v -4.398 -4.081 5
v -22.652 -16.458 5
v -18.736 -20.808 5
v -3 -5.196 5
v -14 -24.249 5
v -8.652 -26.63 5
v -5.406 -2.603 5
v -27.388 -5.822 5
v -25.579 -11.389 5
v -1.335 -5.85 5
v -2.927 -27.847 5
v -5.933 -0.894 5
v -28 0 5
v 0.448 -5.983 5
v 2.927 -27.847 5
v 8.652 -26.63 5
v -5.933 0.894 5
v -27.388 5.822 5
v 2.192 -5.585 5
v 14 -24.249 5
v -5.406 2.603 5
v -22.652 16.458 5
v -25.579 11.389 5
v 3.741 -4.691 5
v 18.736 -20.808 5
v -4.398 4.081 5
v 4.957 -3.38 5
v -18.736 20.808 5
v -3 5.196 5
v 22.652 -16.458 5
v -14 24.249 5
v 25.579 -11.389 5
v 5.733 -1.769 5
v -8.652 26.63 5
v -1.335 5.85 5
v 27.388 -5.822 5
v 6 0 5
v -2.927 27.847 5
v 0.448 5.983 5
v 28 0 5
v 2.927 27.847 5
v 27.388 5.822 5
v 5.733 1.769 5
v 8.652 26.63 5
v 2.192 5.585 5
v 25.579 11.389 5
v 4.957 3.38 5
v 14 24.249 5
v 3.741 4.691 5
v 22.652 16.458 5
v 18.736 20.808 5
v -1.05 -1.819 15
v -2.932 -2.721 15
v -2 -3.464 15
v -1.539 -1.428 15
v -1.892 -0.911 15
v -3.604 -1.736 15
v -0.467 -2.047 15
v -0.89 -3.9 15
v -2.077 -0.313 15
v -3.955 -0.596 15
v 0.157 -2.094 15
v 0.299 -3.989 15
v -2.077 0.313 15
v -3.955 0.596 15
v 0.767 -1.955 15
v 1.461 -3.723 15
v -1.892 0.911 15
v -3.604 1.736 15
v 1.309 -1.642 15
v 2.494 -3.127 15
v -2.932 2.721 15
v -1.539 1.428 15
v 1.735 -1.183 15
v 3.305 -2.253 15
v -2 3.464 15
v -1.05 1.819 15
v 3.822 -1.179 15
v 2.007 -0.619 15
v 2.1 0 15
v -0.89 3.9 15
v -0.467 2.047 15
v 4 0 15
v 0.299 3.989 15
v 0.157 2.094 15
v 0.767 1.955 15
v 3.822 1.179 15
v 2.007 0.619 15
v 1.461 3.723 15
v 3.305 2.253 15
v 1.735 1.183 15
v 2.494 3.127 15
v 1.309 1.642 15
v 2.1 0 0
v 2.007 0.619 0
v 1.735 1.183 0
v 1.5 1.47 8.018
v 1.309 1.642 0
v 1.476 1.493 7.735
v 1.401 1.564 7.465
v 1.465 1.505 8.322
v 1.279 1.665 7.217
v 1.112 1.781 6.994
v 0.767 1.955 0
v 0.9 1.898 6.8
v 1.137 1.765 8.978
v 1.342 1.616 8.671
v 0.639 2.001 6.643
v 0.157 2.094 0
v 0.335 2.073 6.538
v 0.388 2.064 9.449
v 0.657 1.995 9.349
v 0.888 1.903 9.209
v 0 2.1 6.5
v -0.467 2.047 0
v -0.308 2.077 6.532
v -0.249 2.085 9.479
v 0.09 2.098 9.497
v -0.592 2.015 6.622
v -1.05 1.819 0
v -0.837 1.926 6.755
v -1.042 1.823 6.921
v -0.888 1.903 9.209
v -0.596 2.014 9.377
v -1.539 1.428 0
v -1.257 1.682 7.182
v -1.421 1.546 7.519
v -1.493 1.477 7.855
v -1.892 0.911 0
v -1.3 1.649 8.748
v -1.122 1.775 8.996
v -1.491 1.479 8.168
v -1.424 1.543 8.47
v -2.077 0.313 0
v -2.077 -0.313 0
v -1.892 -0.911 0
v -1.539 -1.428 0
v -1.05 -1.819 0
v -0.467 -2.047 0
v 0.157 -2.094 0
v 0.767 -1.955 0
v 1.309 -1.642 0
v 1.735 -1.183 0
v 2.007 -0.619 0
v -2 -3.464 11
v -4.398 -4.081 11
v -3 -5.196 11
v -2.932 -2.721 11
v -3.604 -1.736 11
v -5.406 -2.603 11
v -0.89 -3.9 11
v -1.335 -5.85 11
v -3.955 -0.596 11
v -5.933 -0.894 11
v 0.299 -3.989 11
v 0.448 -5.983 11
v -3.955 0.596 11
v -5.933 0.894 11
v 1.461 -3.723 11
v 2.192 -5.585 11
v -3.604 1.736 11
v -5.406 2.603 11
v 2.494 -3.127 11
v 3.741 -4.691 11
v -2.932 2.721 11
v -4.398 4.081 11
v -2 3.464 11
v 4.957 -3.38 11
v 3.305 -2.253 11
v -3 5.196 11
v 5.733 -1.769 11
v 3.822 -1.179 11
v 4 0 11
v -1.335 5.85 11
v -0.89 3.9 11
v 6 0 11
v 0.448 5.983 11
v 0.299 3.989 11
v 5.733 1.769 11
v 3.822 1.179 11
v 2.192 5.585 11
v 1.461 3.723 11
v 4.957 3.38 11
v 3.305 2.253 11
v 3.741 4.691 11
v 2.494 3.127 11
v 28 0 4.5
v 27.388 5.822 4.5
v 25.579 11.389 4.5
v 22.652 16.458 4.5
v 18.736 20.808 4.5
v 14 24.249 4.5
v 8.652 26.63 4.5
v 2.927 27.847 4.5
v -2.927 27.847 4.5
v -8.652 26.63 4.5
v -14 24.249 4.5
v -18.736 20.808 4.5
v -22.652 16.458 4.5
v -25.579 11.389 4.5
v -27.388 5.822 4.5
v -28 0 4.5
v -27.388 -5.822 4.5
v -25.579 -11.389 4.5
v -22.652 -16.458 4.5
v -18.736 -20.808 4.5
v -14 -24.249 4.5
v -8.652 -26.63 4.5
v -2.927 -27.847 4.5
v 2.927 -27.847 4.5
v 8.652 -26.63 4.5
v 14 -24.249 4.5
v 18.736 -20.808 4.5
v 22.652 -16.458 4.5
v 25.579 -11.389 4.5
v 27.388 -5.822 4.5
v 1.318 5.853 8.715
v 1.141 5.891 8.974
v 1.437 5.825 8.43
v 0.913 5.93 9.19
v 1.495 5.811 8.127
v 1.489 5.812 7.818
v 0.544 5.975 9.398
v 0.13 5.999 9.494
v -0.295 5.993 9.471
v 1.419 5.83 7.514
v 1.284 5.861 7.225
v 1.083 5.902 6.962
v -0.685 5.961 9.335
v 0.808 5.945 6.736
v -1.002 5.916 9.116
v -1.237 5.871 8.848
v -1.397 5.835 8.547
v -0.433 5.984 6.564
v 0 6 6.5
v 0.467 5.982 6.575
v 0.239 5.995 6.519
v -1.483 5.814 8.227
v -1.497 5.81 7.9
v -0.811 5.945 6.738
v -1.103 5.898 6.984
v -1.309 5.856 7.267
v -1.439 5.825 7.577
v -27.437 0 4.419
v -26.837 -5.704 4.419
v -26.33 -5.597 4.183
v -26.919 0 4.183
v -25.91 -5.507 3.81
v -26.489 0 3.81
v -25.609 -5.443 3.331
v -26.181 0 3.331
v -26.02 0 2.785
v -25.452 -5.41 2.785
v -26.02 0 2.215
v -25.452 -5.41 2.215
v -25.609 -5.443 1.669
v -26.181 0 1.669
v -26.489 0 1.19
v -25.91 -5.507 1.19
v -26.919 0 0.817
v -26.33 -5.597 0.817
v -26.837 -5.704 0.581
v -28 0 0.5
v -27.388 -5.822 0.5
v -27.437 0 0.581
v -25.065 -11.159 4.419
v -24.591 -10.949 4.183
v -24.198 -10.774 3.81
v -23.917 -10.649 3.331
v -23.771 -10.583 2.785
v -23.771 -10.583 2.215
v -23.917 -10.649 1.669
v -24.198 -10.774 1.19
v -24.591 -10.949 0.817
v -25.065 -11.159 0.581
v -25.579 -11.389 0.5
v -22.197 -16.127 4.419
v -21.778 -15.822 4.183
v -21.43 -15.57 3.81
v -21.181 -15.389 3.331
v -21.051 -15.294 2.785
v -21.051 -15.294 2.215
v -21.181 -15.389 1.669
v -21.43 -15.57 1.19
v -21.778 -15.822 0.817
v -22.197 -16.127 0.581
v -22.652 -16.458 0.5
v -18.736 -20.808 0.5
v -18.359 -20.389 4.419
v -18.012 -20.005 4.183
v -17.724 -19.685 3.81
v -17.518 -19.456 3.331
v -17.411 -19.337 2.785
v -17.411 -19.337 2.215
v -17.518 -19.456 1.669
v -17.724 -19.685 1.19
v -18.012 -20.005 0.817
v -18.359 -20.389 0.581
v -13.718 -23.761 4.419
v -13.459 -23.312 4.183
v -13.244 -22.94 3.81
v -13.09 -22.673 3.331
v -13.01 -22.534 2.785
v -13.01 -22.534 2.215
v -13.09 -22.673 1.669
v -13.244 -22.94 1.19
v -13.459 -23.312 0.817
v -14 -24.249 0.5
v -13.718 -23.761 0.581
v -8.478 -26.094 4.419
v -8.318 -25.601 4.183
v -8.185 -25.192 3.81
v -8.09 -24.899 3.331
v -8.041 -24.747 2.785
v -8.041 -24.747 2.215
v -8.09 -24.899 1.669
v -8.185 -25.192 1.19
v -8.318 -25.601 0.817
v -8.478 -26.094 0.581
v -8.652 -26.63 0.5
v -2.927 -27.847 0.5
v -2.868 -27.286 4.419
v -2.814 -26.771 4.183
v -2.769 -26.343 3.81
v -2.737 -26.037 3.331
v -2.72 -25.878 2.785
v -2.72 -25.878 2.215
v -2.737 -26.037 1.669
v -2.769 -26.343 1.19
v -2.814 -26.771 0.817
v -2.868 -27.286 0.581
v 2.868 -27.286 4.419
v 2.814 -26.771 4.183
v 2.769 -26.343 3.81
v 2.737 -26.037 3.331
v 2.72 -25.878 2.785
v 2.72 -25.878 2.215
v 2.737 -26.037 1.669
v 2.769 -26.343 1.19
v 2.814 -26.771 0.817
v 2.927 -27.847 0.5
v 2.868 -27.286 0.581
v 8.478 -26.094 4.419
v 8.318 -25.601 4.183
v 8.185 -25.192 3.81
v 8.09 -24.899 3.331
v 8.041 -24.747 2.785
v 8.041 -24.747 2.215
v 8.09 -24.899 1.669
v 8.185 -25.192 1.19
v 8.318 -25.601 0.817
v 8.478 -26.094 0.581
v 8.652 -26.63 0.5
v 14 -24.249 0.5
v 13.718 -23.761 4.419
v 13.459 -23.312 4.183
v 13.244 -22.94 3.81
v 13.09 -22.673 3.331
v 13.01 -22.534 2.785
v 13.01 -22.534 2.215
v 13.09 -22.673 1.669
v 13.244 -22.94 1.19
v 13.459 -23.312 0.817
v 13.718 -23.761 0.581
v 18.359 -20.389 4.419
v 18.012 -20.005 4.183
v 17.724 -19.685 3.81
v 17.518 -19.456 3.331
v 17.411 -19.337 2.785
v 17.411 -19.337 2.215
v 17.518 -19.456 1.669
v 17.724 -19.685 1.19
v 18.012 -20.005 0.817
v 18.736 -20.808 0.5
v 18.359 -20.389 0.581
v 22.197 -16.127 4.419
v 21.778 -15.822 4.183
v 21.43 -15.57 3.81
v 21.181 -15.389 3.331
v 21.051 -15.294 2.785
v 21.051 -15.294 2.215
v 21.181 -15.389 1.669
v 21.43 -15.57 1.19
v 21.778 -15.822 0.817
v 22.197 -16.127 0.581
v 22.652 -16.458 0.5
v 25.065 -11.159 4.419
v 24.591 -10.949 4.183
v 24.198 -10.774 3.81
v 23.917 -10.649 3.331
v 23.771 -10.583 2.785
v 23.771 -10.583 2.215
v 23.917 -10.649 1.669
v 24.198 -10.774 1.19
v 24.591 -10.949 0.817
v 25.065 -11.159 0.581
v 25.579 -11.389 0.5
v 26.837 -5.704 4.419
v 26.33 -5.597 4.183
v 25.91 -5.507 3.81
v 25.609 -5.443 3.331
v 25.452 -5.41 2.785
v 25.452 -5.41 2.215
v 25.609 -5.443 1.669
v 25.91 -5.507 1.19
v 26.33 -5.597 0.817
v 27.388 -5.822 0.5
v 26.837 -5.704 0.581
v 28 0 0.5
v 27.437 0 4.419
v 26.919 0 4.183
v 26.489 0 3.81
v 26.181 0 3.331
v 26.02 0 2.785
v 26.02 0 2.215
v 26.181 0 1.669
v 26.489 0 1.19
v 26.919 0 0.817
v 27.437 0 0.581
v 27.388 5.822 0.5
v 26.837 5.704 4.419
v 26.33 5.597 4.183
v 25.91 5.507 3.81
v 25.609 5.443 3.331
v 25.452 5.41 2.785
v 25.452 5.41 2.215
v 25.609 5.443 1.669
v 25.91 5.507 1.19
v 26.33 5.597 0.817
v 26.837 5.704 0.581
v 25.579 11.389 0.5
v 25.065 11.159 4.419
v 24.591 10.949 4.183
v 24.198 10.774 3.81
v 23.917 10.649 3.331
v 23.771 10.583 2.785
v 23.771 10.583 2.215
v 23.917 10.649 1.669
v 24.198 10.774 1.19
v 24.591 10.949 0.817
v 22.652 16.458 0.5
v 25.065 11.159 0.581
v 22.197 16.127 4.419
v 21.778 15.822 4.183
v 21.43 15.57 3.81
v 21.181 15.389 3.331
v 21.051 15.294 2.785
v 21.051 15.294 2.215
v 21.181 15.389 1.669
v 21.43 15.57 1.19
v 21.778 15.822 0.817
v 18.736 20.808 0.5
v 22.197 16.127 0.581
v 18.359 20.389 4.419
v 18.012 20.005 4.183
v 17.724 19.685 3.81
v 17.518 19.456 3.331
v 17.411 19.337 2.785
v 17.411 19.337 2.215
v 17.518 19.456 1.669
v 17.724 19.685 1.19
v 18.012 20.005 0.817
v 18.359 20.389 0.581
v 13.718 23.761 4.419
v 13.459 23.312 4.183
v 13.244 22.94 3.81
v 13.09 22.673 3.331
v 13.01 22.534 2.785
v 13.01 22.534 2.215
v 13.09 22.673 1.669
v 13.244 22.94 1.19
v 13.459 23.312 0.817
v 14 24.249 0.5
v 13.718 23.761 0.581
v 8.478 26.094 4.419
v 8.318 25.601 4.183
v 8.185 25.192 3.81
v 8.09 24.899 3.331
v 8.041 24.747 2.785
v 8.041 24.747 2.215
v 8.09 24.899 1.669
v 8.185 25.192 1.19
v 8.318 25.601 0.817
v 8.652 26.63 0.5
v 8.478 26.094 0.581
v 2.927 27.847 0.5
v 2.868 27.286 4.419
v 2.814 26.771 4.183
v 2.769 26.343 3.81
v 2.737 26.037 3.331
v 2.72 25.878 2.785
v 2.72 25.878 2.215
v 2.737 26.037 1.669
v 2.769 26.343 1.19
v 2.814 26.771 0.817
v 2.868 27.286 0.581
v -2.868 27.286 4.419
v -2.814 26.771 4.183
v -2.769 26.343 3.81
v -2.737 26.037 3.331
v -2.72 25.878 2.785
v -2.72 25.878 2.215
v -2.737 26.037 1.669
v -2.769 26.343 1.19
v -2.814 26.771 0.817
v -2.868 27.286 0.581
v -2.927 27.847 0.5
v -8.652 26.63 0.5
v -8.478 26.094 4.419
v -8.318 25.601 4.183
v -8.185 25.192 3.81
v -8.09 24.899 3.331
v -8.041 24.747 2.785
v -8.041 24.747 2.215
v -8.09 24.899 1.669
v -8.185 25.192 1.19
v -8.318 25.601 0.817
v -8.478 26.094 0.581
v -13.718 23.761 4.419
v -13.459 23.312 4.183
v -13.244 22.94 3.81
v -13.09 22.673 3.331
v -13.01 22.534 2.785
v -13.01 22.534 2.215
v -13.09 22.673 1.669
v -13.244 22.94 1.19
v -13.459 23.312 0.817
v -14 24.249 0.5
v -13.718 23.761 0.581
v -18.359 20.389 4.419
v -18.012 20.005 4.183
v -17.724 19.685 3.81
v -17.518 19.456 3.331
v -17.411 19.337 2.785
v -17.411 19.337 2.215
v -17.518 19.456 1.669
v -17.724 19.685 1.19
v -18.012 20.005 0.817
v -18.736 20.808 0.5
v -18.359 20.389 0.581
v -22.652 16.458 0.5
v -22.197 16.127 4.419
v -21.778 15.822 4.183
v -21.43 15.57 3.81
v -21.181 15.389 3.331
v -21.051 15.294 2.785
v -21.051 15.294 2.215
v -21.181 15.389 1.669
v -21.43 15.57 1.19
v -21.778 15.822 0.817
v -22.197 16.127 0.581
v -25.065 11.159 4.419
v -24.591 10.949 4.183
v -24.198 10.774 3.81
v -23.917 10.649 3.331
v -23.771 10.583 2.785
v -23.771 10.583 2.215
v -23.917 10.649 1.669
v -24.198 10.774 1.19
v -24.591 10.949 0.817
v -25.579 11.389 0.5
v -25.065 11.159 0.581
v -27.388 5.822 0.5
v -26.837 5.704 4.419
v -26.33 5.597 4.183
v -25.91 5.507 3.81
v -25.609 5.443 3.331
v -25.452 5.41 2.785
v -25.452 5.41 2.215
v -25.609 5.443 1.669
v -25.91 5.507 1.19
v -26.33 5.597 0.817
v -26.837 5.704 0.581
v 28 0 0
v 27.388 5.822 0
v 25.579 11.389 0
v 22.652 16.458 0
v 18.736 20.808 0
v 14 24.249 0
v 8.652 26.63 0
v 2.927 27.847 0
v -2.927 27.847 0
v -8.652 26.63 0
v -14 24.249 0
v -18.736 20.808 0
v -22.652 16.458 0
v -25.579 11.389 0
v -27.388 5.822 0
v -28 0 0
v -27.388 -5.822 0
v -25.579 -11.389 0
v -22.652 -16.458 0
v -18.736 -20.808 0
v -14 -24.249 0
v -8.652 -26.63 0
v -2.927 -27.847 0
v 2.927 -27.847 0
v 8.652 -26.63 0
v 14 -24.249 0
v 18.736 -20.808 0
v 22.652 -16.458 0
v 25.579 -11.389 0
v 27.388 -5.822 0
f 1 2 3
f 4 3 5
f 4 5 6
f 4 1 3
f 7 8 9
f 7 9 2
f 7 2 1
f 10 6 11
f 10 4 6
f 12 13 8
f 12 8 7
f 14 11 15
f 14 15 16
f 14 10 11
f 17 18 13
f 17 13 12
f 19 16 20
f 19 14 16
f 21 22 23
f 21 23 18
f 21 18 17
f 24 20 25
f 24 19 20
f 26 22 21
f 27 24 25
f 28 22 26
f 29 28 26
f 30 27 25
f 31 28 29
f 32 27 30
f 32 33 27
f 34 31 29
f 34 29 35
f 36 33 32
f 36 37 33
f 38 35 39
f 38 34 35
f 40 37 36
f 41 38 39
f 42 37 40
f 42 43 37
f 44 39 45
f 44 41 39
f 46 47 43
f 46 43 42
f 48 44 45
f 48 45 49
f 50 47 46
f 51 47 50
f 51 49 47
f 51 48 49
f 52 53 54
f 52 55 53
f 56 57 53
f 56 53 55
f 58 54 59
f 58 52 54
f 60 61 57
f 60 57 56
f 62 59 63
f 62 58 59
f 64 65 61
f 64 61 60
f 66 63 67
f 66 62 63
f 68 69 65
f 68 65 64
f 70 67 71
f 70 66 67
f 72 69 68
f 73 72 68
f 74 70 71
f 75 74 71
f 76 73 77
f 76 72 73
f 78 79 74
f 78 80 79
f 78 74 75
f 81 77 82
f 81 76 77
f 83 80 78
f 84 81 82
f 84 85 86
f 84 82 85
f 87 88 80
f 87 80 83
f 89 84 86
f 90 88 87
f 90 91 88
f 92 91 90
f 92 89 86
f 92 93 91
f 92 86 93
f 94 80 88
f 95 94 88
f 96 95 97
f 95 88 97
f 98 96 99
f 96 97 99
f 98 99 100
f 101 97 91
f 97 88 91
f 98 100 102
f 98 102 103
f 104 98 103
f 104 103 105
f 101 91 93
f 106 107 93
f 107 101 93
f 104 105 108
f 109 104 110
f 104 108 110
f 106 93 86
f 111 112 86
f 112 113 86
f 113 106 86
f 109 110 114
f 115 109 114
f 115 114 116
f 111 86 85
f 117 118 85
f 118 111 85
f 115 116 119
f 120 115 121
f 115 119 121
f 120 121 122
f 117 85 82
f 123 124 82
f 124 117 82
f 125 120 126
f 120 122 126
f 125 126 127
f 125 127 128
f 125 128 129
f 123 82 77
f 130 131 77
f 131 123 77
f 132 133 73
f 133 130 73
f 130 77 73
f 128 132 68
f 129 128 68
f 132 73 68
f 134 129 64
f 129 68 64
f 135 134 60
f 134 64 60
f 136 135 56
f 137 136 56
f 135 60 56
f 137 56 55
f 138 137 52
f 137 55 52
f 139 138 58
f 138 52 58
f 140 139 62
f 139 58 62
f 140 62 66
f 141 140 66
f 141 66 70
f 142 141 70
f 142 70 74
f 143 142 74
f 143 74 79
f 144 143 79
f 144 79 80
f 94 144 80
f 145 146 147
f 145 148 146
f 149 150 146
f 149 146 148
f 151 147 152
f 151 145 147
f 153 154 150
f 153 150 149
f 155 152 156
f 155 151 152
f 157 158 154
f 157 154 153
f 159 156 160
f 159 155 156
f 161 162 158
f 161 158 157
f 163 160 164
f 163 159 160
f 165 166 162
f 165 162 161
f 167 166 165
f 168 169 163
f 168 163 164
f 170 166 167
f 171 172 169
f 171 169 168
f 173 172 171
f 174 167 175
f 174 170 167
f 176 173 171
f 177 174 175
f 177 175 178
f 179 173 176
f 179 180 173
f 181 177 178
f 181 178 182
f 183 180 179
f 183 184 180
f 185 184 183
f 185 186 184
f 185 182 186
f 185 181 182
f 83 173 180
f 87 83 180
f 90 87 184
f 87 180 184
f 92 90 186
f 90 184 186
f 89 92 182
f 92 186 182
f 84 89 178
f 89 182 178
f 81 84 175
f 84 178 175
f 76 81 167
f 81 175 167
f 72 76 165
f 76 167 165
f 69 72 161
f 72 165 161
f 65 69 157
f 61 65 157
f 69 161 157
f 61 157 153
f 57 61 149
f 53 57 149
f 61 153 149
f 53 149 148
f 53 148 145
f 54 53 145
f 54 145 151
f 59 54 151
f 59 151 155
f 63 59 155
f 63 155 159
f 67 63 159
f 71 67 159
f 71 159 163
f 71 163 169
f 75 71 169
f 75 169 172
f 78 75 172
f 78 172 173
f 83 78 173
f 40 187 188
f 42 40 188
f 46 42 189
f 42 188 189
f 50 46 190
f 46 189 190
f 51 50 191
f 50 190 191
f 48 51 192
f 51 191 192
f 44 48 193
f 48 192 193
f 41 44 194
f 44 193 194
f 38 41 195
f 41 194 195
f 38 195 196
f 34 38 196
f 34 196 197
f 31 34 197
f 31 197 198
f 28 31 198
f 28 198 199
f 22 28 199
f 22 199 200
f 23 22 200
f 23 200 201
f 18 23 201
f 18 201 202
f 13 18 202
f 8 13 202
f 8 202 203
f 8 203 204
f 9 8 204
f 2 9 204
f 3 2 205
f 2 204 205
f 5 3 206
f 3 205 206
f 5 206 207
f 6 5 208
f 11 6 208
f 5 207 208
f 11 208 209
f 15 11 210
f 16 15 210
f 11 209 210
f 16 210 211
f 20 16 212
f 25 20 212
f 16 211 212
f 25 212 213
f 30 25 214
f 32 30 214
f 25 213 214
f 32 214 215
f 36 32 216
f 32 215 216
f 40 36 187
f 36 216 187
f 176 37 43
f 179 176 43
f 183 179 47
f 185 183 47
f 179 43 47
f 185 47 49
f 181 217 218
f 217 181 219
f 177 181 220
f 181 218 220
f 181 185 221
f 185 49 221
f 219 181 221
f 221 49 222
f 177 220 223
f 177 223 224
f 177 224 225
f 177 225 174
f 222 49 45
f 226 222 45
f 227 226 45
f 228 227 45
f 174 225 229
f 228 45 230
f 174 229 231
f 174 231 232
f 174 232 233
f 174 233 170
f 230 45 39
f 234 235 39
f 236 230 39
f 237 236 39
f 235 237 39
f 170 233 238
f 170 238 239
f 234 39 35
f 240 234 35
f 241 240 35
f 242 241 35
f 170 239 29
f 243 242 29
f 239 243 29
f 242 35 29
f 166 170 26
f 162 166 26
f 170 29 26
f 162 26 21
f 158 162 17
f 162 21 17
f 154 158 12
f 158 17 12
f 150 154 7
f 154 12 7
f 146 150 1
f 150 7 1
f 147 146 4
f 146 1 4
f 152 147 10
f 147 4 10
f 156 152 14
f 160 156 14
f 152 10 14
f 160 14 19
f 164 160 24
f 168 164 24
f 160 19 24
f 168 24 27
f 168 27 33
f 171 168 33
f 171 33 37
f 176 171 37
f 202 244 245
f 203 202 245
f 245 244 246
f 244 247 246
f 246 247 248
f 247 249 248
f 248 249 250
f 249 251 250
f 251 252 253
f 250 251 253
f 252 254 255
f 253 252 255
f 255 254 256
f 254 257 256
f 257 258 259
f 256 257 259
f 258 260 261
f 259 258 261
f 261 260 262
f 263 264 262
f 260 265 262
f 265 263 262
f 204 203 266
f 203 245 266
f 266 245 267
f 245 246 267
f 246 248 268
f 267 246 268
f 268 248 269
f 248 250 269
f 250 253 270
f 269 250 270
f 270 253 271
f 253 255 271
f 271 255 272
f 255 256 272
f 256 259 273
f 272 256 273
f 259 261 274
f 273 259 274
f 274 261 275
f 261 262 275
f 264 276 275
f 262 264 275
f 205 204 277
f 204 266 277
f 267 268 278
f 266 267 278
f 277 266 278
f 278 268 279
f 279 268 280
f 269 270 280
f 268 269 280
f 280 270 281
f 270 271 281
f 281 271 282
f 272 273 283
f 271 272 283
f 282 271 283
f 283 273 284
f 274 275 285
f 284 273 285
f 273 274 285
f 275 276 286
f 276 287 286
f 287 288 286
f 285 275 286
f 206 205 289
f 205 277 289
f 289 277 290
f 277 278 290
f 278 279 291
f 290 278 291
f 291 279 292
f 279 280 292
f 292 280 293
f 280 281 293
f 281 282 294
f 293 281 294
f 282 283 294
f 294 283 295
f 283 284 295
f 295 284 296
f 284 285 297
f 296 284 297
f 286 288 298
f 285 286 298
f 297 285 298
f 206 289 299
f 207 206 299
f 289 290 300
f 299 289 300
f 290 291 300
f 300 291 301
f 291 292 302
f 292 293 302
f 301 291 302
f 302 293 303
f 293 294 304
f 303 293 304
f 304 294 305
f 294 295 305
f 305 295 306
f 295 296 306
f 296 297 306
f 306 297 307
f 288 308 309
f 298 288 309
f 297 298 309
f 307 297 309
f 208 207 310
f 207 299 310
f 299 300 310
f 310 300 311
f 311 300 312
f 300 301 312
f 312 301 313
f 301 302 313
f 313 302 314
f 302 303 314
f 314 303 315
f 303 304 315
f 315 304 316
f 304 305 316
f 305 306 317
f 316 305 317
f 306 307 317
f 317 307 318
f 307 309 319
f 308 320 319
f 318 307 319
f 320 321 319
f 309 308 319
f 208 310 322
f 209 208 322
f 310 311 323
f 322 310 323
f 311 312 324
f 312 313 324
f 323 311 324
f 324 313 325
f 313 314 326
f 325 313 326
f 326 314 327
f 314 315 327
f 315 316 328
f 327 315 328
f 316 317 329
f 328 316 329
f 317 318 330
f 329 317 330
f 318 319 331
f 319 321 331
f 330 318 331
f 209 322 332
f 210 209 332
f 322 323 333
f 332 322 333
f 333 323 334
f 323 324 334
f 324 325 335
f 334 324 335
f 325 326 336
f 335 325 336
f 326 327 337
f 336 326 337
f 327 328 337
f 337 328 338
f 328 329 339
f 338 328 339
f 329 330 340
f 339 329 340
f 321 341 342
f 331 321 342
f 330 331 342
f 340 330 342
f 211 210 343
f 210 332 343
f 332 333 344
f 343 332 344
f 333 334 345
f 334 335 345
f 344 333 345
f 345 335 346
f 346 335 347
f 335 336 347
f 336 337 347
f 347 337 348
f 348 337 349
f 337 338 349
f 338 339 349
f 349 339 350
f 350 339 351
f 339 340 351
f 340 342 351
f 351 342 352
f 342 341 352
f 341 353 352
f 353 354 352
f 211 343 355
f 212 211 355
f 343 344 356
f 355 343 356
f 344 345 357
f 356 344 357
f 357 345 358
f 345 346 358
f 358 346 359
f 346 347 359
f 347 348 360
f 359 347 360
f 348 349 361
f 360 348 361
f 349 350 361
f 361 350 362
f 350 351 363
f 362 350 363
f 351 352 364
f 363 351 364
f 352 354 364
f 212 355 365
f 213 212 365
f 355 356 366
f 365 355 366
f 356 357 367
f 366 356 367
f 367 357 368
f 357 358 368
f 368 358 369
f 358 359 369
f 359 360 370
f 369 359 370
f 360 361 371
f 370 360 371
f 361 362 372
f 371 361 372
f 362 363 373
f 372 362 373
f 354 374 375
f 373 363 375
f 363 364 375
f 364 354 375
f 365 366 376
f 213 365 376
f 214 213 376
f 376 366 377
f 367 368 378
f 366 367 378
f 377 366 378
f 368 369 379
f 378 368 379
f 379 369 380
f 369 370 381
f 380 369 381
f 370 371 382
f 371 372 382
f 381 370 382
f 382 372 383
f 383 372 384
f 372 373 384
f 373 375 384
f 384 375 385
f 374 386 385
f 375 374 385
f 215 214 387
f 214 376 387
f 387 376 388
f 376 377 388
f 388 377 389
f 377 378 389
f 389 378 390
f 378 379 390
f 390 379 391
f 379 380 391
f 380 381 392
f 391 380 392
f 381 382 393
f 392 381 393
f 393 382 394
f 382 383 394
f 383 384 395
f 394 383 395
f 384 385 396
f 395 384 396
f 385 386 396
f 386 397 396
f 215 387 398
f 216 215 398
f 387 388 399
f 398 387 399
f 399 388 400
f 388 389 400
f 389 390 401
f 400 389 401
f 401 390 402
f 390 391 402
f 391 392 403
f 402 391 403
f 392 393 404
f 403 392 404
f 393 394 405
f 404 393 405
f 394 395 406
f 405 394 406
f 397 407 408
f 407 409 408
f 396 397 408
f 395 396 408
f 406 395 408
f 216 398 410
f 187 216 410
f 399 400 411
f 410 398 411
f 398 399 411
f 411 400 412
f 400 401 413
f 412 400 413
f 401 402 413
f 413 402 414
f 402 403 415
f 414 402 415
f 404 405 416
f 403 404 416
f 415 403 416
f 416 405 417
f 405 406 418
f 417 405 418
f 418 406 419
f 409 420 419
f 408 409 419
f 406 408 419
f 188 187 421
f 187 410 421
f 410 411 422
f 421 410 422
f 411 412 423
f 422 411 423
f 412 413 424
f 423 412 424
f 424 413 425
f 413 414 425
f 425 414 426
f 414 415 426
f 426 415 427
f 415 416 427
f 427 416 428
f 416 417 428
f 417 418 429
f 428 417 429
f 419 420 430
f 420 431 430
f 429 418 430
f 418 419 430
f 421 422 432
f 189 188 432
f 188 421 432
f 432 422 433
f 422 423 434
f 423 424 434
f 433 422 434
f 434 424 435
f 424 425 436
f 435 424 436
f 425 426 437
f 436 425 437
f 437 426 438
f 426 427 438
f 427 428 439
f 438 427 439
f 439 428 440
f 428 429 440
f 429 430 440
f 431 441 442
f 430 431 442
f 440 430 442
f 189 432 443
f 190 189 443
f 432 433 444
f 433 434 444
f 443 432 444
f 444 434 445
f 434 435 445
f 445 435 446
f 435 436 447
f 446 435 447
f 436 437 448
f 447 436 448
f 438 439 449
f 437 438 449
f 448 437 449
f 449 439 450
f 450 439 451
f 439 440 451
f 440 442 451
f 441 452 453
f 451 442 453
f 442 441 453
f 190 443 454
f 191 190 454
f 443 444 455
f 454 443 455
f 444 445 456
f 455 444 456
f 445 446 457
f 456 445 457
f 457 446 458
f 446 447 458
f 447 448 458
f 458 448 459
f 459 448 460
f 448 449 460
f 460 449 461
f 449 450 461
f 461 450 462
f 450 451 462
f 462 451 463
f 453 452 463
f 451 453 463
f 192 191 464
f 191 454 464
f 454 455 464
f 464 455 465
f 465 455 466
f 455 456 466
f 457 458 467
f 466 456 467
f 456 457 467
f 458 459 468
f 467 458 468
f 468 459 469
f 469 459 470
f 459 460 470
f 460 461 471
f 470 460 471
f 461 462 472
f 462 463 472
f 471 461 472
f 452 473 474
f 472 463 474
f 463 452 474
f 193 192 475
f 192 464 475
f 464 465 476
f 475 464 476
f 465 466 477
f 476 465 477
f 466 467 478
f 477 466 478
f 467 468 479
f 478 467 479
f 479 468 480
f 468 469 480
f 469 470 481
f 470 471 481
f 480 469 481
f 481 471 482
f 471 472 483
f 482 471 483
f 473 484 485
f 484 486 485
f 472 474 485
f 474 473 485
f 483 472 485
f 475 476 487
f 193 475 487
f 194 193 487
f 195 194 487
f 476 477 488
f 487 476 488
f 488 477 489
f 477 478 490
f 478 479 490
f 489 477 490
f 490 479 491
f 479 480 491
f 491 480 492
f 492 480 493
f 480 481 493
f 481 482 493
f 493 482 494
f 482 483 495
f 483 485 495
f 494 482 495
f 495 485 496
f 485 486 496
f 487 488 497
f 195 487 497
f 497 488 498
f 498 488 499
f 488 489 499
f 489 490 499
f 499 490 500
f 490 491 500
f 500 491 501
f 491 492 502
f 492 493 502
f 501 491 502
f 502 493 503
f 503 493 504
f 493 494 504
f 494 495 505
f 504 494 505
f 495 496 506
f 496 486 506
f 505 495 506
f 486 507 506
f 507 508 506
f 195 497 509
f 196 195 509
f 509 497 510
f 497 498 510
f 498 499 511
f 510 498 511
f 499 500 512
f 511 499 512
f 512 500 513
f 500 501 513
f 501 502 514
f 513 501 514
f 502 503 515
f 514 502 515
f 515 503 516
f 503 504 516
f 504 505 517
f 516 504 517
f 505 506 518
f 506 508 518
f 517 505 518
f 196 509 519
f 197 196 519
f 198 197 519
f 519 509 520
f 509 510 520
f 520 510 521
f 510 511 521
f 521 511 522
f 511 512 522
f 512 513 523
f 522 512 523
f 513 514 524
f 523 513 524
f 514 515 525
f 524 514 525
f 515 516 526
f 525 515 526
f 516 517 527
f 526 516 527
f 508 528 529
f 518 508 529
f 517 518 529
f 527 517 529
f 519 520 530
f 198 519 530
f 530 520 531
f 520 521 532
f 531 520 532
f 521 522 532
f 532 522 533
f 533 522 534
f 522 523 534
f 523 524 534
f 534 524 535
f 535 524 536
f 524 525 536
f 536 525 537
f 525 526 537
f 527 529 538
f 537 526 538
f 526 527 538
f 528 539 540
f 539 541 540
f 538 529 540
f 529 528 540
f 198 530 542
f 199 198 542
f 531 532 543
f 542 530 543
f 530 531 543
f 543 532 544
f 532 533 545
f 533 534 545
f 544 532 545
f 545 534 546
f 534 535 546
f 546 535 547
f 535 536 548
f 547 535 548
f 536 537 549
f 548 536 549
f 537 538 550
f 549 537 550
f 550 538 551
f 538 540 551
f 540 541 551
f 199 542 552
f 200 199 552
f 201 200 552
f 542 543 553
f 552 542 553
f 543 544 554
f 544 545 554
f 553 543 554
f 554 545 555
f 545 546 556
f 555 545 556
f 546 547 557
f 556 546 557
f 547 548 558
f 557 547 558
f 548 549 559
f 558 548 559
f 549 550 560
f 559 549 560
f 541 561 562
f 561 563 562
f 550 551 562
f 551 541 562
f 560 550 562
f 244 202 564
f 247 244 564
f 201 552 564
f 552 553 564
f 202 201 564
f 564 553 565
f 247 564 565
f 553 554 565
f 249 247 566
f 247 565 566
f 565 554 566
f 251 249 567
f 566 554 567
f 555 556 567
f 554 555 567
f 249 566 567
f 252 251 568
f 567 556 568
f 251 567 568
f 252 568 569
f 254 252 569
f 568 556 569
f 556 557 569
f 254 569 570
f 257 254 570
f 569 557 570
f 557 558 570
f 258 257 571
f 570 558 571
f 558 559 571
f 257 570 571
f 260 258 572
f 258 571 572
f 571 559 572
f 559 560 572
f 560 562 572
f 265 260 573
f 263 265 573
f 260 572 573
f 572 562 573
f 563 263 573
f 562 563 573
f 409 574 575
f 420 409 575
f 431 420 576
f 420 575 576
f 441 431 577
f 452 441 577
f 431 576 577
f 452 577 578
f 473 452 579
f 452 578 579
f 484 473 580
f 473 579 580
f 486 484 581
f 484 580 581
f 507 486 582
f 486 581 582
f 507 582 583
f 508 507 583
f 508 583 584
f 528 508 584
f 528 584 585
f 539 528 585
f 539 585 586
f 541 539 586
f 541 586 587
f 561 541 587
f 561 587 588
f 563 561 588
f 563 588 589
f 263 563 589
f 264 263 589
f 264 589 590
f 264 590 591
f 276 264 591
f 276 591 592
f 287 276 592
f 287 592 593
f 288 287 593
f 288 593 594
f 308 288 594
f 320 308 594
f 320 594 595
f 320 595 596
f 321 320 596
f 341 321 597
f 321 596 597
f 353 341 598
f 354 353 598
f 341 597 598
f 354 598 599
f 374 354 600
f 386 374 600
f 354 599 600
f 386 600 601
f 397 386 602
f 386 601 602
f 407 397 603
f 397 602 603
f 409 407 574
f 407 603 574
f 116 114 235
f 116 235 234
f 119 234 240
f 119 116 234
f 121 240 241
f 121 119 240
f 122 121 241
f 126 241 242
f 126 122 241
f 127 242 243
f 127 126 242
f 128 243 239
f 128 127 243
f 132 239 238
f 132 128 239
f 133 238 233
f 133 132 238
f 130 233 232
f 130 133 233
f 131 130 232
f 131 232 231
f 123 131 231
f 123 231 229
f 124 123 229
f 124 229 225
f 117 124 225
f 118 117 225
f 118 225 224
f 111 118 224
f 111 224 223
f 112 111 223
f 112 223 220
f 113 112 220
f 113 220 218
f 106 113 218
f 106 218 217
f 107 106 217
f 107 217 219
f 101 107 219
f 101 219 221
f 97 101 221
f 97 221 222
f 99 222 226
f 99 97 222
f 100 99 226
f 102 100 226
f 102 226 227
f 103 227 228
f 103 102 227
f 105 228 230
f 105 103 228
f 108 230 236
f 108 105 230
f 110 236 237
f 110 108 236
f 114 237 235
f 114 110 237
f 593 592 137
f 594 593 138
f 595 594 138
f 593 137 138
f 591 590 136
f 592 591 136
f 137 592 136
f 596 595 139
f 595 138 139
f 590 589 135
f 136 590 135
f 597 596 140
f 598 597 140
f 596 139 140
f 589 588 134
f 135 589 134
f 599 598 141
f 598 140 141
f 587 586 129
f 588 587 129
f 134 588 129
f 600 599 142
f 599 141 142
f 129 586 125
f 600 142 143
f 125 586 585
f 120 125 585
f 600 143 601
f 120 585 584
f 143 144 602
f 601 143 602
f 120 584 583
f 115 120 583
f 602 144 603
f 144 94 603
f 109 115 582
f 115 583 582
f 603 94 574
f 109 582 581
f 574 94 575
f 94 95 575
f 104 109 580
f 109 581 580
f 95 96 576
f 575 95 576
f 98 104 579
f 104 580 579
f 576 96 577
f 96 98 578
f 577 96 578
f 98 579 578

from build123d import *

# Parameters (mm, degrees)
ESQUISSE1_R                  = 28
BOSS_EXTRU_1_DEPTH           = 5
ESQUISSE2_R                  = 4
BOSS_EXTRU_2_DEPTH           = 10
ESQUISSE3_R                  = 2.1
ENL_V_MAT_EXTRU_1_DEPTH      = 43.343830719
ESQUISSE4_R                  = 2
ESQUISSE5_R                  = 6
ESQUISSE5_R_2                = 4
BOSS_EXTRU_3_DEPTH           = 6
ENL_V_MAT_EXTRU_2_REACH      = 44.344
ENL_V_MAT_EXTRU_2_END_RADIUS = 6
ESQUISSE6_R                  = 1.5


with BuildPart() as part:
    # Esquisse1 → Boss.-Extru.1 (new body)
    with BuildSketch(Plane.XY):
        Circle(ESQUISSE1_R)
    extrude(amount=BOSS_EXTRU_1_DEPTH)

    # Esquisse2 → Boss.-Extru.2 (add)
    with BuildSketch(Plane.XY.offset(5)):
        Circle(ESQUISSE2_R)
    extrude(amount=BOSS_EXTRU_2_DEPTH)

    # Esquisse3 → Enlèv. mat.-Extru.1 (cut, through all)
    with BuildSketch(Plane.XY.offset(15)):
        Circle(ESQUISSE3_R)
    extrude(amount=-ENL_V_MAT_EXTRU_1_DEPTH, mode=Mode.SUBTRACT)

    # Esquisse4 → Enlèvement de matière-Révolution1 (revolve, cut)
    with BuildSketch(Plane(origin=(0, 0, 0), x_dir=(0, 0, -1), z_dir=(1, 0, 0)), mode=Mode.PRIVATE) as enl_vement_de_mati_re_r_volution1_sk:
        with Locations((-2.5, 28)):
            Circle(ESQUISSE4_R)
    revolve(enl_vement_de_mati_re_r_volution1_sk.sketch.rotate(Axis((0, 0, 0), (0, 0, 1)), 90), axis=Axis((0, 0, 0), (0, 0, 1)), mode=Mode.SUBTRACT)

    # Esquisse5 → Boss.-Extru.3 (add)
    with BuildSketch(Plane.XY.offset(5)):
        Circle(ESQUISSE5_R)
        Circle(ESQUISSE5_R_2, mode=Mode.SUBTRACT)
    extrude(amount=BOSS_EXTRU_3_DEPTH)

    # Enlèv. mat.-Extru.2: up to this cylinder (the profile starts inside it)
    enl_v_mat_extru_2_end = Plane(origin=(0, 0, 8), z_dir=(0, 0, -1)) * Cylinder(ENL_V_MAT_EXTRU_2_END_RADIUS, 101.688, mode=Mode.PRIVATE)
    # Esquisse6 → Enlèv. mat.-Extru.2 (cut, up to the surface)
    with BuildSketch(Plane(origin=(0, 0, 0), x_dir=(1, 0, 0), z_dir=(0, 1, 0)), mode=Mode.PRIVATE) as enl_v_mat_extru_2_sk1:
        with Locations(Location((0, -8, 0), (0, 0, 90))):
            Circle(ESQUISSE6_R)
    enl_v_mat_extru_2_tool1 = extrude(enl_v_mat_extru_2_sk1.sketch, amount=ENL_V_MAT_EXTRU_2_REACH, mode=Mode.PRIVATE) & enl_v_mat_extru_2_end
    add(enl_v_mat_extru_2_tool1.solids().sort_by_distance((0, 0, 8))[0], mode=Mode.SUBTRACT)


solid = part.part
